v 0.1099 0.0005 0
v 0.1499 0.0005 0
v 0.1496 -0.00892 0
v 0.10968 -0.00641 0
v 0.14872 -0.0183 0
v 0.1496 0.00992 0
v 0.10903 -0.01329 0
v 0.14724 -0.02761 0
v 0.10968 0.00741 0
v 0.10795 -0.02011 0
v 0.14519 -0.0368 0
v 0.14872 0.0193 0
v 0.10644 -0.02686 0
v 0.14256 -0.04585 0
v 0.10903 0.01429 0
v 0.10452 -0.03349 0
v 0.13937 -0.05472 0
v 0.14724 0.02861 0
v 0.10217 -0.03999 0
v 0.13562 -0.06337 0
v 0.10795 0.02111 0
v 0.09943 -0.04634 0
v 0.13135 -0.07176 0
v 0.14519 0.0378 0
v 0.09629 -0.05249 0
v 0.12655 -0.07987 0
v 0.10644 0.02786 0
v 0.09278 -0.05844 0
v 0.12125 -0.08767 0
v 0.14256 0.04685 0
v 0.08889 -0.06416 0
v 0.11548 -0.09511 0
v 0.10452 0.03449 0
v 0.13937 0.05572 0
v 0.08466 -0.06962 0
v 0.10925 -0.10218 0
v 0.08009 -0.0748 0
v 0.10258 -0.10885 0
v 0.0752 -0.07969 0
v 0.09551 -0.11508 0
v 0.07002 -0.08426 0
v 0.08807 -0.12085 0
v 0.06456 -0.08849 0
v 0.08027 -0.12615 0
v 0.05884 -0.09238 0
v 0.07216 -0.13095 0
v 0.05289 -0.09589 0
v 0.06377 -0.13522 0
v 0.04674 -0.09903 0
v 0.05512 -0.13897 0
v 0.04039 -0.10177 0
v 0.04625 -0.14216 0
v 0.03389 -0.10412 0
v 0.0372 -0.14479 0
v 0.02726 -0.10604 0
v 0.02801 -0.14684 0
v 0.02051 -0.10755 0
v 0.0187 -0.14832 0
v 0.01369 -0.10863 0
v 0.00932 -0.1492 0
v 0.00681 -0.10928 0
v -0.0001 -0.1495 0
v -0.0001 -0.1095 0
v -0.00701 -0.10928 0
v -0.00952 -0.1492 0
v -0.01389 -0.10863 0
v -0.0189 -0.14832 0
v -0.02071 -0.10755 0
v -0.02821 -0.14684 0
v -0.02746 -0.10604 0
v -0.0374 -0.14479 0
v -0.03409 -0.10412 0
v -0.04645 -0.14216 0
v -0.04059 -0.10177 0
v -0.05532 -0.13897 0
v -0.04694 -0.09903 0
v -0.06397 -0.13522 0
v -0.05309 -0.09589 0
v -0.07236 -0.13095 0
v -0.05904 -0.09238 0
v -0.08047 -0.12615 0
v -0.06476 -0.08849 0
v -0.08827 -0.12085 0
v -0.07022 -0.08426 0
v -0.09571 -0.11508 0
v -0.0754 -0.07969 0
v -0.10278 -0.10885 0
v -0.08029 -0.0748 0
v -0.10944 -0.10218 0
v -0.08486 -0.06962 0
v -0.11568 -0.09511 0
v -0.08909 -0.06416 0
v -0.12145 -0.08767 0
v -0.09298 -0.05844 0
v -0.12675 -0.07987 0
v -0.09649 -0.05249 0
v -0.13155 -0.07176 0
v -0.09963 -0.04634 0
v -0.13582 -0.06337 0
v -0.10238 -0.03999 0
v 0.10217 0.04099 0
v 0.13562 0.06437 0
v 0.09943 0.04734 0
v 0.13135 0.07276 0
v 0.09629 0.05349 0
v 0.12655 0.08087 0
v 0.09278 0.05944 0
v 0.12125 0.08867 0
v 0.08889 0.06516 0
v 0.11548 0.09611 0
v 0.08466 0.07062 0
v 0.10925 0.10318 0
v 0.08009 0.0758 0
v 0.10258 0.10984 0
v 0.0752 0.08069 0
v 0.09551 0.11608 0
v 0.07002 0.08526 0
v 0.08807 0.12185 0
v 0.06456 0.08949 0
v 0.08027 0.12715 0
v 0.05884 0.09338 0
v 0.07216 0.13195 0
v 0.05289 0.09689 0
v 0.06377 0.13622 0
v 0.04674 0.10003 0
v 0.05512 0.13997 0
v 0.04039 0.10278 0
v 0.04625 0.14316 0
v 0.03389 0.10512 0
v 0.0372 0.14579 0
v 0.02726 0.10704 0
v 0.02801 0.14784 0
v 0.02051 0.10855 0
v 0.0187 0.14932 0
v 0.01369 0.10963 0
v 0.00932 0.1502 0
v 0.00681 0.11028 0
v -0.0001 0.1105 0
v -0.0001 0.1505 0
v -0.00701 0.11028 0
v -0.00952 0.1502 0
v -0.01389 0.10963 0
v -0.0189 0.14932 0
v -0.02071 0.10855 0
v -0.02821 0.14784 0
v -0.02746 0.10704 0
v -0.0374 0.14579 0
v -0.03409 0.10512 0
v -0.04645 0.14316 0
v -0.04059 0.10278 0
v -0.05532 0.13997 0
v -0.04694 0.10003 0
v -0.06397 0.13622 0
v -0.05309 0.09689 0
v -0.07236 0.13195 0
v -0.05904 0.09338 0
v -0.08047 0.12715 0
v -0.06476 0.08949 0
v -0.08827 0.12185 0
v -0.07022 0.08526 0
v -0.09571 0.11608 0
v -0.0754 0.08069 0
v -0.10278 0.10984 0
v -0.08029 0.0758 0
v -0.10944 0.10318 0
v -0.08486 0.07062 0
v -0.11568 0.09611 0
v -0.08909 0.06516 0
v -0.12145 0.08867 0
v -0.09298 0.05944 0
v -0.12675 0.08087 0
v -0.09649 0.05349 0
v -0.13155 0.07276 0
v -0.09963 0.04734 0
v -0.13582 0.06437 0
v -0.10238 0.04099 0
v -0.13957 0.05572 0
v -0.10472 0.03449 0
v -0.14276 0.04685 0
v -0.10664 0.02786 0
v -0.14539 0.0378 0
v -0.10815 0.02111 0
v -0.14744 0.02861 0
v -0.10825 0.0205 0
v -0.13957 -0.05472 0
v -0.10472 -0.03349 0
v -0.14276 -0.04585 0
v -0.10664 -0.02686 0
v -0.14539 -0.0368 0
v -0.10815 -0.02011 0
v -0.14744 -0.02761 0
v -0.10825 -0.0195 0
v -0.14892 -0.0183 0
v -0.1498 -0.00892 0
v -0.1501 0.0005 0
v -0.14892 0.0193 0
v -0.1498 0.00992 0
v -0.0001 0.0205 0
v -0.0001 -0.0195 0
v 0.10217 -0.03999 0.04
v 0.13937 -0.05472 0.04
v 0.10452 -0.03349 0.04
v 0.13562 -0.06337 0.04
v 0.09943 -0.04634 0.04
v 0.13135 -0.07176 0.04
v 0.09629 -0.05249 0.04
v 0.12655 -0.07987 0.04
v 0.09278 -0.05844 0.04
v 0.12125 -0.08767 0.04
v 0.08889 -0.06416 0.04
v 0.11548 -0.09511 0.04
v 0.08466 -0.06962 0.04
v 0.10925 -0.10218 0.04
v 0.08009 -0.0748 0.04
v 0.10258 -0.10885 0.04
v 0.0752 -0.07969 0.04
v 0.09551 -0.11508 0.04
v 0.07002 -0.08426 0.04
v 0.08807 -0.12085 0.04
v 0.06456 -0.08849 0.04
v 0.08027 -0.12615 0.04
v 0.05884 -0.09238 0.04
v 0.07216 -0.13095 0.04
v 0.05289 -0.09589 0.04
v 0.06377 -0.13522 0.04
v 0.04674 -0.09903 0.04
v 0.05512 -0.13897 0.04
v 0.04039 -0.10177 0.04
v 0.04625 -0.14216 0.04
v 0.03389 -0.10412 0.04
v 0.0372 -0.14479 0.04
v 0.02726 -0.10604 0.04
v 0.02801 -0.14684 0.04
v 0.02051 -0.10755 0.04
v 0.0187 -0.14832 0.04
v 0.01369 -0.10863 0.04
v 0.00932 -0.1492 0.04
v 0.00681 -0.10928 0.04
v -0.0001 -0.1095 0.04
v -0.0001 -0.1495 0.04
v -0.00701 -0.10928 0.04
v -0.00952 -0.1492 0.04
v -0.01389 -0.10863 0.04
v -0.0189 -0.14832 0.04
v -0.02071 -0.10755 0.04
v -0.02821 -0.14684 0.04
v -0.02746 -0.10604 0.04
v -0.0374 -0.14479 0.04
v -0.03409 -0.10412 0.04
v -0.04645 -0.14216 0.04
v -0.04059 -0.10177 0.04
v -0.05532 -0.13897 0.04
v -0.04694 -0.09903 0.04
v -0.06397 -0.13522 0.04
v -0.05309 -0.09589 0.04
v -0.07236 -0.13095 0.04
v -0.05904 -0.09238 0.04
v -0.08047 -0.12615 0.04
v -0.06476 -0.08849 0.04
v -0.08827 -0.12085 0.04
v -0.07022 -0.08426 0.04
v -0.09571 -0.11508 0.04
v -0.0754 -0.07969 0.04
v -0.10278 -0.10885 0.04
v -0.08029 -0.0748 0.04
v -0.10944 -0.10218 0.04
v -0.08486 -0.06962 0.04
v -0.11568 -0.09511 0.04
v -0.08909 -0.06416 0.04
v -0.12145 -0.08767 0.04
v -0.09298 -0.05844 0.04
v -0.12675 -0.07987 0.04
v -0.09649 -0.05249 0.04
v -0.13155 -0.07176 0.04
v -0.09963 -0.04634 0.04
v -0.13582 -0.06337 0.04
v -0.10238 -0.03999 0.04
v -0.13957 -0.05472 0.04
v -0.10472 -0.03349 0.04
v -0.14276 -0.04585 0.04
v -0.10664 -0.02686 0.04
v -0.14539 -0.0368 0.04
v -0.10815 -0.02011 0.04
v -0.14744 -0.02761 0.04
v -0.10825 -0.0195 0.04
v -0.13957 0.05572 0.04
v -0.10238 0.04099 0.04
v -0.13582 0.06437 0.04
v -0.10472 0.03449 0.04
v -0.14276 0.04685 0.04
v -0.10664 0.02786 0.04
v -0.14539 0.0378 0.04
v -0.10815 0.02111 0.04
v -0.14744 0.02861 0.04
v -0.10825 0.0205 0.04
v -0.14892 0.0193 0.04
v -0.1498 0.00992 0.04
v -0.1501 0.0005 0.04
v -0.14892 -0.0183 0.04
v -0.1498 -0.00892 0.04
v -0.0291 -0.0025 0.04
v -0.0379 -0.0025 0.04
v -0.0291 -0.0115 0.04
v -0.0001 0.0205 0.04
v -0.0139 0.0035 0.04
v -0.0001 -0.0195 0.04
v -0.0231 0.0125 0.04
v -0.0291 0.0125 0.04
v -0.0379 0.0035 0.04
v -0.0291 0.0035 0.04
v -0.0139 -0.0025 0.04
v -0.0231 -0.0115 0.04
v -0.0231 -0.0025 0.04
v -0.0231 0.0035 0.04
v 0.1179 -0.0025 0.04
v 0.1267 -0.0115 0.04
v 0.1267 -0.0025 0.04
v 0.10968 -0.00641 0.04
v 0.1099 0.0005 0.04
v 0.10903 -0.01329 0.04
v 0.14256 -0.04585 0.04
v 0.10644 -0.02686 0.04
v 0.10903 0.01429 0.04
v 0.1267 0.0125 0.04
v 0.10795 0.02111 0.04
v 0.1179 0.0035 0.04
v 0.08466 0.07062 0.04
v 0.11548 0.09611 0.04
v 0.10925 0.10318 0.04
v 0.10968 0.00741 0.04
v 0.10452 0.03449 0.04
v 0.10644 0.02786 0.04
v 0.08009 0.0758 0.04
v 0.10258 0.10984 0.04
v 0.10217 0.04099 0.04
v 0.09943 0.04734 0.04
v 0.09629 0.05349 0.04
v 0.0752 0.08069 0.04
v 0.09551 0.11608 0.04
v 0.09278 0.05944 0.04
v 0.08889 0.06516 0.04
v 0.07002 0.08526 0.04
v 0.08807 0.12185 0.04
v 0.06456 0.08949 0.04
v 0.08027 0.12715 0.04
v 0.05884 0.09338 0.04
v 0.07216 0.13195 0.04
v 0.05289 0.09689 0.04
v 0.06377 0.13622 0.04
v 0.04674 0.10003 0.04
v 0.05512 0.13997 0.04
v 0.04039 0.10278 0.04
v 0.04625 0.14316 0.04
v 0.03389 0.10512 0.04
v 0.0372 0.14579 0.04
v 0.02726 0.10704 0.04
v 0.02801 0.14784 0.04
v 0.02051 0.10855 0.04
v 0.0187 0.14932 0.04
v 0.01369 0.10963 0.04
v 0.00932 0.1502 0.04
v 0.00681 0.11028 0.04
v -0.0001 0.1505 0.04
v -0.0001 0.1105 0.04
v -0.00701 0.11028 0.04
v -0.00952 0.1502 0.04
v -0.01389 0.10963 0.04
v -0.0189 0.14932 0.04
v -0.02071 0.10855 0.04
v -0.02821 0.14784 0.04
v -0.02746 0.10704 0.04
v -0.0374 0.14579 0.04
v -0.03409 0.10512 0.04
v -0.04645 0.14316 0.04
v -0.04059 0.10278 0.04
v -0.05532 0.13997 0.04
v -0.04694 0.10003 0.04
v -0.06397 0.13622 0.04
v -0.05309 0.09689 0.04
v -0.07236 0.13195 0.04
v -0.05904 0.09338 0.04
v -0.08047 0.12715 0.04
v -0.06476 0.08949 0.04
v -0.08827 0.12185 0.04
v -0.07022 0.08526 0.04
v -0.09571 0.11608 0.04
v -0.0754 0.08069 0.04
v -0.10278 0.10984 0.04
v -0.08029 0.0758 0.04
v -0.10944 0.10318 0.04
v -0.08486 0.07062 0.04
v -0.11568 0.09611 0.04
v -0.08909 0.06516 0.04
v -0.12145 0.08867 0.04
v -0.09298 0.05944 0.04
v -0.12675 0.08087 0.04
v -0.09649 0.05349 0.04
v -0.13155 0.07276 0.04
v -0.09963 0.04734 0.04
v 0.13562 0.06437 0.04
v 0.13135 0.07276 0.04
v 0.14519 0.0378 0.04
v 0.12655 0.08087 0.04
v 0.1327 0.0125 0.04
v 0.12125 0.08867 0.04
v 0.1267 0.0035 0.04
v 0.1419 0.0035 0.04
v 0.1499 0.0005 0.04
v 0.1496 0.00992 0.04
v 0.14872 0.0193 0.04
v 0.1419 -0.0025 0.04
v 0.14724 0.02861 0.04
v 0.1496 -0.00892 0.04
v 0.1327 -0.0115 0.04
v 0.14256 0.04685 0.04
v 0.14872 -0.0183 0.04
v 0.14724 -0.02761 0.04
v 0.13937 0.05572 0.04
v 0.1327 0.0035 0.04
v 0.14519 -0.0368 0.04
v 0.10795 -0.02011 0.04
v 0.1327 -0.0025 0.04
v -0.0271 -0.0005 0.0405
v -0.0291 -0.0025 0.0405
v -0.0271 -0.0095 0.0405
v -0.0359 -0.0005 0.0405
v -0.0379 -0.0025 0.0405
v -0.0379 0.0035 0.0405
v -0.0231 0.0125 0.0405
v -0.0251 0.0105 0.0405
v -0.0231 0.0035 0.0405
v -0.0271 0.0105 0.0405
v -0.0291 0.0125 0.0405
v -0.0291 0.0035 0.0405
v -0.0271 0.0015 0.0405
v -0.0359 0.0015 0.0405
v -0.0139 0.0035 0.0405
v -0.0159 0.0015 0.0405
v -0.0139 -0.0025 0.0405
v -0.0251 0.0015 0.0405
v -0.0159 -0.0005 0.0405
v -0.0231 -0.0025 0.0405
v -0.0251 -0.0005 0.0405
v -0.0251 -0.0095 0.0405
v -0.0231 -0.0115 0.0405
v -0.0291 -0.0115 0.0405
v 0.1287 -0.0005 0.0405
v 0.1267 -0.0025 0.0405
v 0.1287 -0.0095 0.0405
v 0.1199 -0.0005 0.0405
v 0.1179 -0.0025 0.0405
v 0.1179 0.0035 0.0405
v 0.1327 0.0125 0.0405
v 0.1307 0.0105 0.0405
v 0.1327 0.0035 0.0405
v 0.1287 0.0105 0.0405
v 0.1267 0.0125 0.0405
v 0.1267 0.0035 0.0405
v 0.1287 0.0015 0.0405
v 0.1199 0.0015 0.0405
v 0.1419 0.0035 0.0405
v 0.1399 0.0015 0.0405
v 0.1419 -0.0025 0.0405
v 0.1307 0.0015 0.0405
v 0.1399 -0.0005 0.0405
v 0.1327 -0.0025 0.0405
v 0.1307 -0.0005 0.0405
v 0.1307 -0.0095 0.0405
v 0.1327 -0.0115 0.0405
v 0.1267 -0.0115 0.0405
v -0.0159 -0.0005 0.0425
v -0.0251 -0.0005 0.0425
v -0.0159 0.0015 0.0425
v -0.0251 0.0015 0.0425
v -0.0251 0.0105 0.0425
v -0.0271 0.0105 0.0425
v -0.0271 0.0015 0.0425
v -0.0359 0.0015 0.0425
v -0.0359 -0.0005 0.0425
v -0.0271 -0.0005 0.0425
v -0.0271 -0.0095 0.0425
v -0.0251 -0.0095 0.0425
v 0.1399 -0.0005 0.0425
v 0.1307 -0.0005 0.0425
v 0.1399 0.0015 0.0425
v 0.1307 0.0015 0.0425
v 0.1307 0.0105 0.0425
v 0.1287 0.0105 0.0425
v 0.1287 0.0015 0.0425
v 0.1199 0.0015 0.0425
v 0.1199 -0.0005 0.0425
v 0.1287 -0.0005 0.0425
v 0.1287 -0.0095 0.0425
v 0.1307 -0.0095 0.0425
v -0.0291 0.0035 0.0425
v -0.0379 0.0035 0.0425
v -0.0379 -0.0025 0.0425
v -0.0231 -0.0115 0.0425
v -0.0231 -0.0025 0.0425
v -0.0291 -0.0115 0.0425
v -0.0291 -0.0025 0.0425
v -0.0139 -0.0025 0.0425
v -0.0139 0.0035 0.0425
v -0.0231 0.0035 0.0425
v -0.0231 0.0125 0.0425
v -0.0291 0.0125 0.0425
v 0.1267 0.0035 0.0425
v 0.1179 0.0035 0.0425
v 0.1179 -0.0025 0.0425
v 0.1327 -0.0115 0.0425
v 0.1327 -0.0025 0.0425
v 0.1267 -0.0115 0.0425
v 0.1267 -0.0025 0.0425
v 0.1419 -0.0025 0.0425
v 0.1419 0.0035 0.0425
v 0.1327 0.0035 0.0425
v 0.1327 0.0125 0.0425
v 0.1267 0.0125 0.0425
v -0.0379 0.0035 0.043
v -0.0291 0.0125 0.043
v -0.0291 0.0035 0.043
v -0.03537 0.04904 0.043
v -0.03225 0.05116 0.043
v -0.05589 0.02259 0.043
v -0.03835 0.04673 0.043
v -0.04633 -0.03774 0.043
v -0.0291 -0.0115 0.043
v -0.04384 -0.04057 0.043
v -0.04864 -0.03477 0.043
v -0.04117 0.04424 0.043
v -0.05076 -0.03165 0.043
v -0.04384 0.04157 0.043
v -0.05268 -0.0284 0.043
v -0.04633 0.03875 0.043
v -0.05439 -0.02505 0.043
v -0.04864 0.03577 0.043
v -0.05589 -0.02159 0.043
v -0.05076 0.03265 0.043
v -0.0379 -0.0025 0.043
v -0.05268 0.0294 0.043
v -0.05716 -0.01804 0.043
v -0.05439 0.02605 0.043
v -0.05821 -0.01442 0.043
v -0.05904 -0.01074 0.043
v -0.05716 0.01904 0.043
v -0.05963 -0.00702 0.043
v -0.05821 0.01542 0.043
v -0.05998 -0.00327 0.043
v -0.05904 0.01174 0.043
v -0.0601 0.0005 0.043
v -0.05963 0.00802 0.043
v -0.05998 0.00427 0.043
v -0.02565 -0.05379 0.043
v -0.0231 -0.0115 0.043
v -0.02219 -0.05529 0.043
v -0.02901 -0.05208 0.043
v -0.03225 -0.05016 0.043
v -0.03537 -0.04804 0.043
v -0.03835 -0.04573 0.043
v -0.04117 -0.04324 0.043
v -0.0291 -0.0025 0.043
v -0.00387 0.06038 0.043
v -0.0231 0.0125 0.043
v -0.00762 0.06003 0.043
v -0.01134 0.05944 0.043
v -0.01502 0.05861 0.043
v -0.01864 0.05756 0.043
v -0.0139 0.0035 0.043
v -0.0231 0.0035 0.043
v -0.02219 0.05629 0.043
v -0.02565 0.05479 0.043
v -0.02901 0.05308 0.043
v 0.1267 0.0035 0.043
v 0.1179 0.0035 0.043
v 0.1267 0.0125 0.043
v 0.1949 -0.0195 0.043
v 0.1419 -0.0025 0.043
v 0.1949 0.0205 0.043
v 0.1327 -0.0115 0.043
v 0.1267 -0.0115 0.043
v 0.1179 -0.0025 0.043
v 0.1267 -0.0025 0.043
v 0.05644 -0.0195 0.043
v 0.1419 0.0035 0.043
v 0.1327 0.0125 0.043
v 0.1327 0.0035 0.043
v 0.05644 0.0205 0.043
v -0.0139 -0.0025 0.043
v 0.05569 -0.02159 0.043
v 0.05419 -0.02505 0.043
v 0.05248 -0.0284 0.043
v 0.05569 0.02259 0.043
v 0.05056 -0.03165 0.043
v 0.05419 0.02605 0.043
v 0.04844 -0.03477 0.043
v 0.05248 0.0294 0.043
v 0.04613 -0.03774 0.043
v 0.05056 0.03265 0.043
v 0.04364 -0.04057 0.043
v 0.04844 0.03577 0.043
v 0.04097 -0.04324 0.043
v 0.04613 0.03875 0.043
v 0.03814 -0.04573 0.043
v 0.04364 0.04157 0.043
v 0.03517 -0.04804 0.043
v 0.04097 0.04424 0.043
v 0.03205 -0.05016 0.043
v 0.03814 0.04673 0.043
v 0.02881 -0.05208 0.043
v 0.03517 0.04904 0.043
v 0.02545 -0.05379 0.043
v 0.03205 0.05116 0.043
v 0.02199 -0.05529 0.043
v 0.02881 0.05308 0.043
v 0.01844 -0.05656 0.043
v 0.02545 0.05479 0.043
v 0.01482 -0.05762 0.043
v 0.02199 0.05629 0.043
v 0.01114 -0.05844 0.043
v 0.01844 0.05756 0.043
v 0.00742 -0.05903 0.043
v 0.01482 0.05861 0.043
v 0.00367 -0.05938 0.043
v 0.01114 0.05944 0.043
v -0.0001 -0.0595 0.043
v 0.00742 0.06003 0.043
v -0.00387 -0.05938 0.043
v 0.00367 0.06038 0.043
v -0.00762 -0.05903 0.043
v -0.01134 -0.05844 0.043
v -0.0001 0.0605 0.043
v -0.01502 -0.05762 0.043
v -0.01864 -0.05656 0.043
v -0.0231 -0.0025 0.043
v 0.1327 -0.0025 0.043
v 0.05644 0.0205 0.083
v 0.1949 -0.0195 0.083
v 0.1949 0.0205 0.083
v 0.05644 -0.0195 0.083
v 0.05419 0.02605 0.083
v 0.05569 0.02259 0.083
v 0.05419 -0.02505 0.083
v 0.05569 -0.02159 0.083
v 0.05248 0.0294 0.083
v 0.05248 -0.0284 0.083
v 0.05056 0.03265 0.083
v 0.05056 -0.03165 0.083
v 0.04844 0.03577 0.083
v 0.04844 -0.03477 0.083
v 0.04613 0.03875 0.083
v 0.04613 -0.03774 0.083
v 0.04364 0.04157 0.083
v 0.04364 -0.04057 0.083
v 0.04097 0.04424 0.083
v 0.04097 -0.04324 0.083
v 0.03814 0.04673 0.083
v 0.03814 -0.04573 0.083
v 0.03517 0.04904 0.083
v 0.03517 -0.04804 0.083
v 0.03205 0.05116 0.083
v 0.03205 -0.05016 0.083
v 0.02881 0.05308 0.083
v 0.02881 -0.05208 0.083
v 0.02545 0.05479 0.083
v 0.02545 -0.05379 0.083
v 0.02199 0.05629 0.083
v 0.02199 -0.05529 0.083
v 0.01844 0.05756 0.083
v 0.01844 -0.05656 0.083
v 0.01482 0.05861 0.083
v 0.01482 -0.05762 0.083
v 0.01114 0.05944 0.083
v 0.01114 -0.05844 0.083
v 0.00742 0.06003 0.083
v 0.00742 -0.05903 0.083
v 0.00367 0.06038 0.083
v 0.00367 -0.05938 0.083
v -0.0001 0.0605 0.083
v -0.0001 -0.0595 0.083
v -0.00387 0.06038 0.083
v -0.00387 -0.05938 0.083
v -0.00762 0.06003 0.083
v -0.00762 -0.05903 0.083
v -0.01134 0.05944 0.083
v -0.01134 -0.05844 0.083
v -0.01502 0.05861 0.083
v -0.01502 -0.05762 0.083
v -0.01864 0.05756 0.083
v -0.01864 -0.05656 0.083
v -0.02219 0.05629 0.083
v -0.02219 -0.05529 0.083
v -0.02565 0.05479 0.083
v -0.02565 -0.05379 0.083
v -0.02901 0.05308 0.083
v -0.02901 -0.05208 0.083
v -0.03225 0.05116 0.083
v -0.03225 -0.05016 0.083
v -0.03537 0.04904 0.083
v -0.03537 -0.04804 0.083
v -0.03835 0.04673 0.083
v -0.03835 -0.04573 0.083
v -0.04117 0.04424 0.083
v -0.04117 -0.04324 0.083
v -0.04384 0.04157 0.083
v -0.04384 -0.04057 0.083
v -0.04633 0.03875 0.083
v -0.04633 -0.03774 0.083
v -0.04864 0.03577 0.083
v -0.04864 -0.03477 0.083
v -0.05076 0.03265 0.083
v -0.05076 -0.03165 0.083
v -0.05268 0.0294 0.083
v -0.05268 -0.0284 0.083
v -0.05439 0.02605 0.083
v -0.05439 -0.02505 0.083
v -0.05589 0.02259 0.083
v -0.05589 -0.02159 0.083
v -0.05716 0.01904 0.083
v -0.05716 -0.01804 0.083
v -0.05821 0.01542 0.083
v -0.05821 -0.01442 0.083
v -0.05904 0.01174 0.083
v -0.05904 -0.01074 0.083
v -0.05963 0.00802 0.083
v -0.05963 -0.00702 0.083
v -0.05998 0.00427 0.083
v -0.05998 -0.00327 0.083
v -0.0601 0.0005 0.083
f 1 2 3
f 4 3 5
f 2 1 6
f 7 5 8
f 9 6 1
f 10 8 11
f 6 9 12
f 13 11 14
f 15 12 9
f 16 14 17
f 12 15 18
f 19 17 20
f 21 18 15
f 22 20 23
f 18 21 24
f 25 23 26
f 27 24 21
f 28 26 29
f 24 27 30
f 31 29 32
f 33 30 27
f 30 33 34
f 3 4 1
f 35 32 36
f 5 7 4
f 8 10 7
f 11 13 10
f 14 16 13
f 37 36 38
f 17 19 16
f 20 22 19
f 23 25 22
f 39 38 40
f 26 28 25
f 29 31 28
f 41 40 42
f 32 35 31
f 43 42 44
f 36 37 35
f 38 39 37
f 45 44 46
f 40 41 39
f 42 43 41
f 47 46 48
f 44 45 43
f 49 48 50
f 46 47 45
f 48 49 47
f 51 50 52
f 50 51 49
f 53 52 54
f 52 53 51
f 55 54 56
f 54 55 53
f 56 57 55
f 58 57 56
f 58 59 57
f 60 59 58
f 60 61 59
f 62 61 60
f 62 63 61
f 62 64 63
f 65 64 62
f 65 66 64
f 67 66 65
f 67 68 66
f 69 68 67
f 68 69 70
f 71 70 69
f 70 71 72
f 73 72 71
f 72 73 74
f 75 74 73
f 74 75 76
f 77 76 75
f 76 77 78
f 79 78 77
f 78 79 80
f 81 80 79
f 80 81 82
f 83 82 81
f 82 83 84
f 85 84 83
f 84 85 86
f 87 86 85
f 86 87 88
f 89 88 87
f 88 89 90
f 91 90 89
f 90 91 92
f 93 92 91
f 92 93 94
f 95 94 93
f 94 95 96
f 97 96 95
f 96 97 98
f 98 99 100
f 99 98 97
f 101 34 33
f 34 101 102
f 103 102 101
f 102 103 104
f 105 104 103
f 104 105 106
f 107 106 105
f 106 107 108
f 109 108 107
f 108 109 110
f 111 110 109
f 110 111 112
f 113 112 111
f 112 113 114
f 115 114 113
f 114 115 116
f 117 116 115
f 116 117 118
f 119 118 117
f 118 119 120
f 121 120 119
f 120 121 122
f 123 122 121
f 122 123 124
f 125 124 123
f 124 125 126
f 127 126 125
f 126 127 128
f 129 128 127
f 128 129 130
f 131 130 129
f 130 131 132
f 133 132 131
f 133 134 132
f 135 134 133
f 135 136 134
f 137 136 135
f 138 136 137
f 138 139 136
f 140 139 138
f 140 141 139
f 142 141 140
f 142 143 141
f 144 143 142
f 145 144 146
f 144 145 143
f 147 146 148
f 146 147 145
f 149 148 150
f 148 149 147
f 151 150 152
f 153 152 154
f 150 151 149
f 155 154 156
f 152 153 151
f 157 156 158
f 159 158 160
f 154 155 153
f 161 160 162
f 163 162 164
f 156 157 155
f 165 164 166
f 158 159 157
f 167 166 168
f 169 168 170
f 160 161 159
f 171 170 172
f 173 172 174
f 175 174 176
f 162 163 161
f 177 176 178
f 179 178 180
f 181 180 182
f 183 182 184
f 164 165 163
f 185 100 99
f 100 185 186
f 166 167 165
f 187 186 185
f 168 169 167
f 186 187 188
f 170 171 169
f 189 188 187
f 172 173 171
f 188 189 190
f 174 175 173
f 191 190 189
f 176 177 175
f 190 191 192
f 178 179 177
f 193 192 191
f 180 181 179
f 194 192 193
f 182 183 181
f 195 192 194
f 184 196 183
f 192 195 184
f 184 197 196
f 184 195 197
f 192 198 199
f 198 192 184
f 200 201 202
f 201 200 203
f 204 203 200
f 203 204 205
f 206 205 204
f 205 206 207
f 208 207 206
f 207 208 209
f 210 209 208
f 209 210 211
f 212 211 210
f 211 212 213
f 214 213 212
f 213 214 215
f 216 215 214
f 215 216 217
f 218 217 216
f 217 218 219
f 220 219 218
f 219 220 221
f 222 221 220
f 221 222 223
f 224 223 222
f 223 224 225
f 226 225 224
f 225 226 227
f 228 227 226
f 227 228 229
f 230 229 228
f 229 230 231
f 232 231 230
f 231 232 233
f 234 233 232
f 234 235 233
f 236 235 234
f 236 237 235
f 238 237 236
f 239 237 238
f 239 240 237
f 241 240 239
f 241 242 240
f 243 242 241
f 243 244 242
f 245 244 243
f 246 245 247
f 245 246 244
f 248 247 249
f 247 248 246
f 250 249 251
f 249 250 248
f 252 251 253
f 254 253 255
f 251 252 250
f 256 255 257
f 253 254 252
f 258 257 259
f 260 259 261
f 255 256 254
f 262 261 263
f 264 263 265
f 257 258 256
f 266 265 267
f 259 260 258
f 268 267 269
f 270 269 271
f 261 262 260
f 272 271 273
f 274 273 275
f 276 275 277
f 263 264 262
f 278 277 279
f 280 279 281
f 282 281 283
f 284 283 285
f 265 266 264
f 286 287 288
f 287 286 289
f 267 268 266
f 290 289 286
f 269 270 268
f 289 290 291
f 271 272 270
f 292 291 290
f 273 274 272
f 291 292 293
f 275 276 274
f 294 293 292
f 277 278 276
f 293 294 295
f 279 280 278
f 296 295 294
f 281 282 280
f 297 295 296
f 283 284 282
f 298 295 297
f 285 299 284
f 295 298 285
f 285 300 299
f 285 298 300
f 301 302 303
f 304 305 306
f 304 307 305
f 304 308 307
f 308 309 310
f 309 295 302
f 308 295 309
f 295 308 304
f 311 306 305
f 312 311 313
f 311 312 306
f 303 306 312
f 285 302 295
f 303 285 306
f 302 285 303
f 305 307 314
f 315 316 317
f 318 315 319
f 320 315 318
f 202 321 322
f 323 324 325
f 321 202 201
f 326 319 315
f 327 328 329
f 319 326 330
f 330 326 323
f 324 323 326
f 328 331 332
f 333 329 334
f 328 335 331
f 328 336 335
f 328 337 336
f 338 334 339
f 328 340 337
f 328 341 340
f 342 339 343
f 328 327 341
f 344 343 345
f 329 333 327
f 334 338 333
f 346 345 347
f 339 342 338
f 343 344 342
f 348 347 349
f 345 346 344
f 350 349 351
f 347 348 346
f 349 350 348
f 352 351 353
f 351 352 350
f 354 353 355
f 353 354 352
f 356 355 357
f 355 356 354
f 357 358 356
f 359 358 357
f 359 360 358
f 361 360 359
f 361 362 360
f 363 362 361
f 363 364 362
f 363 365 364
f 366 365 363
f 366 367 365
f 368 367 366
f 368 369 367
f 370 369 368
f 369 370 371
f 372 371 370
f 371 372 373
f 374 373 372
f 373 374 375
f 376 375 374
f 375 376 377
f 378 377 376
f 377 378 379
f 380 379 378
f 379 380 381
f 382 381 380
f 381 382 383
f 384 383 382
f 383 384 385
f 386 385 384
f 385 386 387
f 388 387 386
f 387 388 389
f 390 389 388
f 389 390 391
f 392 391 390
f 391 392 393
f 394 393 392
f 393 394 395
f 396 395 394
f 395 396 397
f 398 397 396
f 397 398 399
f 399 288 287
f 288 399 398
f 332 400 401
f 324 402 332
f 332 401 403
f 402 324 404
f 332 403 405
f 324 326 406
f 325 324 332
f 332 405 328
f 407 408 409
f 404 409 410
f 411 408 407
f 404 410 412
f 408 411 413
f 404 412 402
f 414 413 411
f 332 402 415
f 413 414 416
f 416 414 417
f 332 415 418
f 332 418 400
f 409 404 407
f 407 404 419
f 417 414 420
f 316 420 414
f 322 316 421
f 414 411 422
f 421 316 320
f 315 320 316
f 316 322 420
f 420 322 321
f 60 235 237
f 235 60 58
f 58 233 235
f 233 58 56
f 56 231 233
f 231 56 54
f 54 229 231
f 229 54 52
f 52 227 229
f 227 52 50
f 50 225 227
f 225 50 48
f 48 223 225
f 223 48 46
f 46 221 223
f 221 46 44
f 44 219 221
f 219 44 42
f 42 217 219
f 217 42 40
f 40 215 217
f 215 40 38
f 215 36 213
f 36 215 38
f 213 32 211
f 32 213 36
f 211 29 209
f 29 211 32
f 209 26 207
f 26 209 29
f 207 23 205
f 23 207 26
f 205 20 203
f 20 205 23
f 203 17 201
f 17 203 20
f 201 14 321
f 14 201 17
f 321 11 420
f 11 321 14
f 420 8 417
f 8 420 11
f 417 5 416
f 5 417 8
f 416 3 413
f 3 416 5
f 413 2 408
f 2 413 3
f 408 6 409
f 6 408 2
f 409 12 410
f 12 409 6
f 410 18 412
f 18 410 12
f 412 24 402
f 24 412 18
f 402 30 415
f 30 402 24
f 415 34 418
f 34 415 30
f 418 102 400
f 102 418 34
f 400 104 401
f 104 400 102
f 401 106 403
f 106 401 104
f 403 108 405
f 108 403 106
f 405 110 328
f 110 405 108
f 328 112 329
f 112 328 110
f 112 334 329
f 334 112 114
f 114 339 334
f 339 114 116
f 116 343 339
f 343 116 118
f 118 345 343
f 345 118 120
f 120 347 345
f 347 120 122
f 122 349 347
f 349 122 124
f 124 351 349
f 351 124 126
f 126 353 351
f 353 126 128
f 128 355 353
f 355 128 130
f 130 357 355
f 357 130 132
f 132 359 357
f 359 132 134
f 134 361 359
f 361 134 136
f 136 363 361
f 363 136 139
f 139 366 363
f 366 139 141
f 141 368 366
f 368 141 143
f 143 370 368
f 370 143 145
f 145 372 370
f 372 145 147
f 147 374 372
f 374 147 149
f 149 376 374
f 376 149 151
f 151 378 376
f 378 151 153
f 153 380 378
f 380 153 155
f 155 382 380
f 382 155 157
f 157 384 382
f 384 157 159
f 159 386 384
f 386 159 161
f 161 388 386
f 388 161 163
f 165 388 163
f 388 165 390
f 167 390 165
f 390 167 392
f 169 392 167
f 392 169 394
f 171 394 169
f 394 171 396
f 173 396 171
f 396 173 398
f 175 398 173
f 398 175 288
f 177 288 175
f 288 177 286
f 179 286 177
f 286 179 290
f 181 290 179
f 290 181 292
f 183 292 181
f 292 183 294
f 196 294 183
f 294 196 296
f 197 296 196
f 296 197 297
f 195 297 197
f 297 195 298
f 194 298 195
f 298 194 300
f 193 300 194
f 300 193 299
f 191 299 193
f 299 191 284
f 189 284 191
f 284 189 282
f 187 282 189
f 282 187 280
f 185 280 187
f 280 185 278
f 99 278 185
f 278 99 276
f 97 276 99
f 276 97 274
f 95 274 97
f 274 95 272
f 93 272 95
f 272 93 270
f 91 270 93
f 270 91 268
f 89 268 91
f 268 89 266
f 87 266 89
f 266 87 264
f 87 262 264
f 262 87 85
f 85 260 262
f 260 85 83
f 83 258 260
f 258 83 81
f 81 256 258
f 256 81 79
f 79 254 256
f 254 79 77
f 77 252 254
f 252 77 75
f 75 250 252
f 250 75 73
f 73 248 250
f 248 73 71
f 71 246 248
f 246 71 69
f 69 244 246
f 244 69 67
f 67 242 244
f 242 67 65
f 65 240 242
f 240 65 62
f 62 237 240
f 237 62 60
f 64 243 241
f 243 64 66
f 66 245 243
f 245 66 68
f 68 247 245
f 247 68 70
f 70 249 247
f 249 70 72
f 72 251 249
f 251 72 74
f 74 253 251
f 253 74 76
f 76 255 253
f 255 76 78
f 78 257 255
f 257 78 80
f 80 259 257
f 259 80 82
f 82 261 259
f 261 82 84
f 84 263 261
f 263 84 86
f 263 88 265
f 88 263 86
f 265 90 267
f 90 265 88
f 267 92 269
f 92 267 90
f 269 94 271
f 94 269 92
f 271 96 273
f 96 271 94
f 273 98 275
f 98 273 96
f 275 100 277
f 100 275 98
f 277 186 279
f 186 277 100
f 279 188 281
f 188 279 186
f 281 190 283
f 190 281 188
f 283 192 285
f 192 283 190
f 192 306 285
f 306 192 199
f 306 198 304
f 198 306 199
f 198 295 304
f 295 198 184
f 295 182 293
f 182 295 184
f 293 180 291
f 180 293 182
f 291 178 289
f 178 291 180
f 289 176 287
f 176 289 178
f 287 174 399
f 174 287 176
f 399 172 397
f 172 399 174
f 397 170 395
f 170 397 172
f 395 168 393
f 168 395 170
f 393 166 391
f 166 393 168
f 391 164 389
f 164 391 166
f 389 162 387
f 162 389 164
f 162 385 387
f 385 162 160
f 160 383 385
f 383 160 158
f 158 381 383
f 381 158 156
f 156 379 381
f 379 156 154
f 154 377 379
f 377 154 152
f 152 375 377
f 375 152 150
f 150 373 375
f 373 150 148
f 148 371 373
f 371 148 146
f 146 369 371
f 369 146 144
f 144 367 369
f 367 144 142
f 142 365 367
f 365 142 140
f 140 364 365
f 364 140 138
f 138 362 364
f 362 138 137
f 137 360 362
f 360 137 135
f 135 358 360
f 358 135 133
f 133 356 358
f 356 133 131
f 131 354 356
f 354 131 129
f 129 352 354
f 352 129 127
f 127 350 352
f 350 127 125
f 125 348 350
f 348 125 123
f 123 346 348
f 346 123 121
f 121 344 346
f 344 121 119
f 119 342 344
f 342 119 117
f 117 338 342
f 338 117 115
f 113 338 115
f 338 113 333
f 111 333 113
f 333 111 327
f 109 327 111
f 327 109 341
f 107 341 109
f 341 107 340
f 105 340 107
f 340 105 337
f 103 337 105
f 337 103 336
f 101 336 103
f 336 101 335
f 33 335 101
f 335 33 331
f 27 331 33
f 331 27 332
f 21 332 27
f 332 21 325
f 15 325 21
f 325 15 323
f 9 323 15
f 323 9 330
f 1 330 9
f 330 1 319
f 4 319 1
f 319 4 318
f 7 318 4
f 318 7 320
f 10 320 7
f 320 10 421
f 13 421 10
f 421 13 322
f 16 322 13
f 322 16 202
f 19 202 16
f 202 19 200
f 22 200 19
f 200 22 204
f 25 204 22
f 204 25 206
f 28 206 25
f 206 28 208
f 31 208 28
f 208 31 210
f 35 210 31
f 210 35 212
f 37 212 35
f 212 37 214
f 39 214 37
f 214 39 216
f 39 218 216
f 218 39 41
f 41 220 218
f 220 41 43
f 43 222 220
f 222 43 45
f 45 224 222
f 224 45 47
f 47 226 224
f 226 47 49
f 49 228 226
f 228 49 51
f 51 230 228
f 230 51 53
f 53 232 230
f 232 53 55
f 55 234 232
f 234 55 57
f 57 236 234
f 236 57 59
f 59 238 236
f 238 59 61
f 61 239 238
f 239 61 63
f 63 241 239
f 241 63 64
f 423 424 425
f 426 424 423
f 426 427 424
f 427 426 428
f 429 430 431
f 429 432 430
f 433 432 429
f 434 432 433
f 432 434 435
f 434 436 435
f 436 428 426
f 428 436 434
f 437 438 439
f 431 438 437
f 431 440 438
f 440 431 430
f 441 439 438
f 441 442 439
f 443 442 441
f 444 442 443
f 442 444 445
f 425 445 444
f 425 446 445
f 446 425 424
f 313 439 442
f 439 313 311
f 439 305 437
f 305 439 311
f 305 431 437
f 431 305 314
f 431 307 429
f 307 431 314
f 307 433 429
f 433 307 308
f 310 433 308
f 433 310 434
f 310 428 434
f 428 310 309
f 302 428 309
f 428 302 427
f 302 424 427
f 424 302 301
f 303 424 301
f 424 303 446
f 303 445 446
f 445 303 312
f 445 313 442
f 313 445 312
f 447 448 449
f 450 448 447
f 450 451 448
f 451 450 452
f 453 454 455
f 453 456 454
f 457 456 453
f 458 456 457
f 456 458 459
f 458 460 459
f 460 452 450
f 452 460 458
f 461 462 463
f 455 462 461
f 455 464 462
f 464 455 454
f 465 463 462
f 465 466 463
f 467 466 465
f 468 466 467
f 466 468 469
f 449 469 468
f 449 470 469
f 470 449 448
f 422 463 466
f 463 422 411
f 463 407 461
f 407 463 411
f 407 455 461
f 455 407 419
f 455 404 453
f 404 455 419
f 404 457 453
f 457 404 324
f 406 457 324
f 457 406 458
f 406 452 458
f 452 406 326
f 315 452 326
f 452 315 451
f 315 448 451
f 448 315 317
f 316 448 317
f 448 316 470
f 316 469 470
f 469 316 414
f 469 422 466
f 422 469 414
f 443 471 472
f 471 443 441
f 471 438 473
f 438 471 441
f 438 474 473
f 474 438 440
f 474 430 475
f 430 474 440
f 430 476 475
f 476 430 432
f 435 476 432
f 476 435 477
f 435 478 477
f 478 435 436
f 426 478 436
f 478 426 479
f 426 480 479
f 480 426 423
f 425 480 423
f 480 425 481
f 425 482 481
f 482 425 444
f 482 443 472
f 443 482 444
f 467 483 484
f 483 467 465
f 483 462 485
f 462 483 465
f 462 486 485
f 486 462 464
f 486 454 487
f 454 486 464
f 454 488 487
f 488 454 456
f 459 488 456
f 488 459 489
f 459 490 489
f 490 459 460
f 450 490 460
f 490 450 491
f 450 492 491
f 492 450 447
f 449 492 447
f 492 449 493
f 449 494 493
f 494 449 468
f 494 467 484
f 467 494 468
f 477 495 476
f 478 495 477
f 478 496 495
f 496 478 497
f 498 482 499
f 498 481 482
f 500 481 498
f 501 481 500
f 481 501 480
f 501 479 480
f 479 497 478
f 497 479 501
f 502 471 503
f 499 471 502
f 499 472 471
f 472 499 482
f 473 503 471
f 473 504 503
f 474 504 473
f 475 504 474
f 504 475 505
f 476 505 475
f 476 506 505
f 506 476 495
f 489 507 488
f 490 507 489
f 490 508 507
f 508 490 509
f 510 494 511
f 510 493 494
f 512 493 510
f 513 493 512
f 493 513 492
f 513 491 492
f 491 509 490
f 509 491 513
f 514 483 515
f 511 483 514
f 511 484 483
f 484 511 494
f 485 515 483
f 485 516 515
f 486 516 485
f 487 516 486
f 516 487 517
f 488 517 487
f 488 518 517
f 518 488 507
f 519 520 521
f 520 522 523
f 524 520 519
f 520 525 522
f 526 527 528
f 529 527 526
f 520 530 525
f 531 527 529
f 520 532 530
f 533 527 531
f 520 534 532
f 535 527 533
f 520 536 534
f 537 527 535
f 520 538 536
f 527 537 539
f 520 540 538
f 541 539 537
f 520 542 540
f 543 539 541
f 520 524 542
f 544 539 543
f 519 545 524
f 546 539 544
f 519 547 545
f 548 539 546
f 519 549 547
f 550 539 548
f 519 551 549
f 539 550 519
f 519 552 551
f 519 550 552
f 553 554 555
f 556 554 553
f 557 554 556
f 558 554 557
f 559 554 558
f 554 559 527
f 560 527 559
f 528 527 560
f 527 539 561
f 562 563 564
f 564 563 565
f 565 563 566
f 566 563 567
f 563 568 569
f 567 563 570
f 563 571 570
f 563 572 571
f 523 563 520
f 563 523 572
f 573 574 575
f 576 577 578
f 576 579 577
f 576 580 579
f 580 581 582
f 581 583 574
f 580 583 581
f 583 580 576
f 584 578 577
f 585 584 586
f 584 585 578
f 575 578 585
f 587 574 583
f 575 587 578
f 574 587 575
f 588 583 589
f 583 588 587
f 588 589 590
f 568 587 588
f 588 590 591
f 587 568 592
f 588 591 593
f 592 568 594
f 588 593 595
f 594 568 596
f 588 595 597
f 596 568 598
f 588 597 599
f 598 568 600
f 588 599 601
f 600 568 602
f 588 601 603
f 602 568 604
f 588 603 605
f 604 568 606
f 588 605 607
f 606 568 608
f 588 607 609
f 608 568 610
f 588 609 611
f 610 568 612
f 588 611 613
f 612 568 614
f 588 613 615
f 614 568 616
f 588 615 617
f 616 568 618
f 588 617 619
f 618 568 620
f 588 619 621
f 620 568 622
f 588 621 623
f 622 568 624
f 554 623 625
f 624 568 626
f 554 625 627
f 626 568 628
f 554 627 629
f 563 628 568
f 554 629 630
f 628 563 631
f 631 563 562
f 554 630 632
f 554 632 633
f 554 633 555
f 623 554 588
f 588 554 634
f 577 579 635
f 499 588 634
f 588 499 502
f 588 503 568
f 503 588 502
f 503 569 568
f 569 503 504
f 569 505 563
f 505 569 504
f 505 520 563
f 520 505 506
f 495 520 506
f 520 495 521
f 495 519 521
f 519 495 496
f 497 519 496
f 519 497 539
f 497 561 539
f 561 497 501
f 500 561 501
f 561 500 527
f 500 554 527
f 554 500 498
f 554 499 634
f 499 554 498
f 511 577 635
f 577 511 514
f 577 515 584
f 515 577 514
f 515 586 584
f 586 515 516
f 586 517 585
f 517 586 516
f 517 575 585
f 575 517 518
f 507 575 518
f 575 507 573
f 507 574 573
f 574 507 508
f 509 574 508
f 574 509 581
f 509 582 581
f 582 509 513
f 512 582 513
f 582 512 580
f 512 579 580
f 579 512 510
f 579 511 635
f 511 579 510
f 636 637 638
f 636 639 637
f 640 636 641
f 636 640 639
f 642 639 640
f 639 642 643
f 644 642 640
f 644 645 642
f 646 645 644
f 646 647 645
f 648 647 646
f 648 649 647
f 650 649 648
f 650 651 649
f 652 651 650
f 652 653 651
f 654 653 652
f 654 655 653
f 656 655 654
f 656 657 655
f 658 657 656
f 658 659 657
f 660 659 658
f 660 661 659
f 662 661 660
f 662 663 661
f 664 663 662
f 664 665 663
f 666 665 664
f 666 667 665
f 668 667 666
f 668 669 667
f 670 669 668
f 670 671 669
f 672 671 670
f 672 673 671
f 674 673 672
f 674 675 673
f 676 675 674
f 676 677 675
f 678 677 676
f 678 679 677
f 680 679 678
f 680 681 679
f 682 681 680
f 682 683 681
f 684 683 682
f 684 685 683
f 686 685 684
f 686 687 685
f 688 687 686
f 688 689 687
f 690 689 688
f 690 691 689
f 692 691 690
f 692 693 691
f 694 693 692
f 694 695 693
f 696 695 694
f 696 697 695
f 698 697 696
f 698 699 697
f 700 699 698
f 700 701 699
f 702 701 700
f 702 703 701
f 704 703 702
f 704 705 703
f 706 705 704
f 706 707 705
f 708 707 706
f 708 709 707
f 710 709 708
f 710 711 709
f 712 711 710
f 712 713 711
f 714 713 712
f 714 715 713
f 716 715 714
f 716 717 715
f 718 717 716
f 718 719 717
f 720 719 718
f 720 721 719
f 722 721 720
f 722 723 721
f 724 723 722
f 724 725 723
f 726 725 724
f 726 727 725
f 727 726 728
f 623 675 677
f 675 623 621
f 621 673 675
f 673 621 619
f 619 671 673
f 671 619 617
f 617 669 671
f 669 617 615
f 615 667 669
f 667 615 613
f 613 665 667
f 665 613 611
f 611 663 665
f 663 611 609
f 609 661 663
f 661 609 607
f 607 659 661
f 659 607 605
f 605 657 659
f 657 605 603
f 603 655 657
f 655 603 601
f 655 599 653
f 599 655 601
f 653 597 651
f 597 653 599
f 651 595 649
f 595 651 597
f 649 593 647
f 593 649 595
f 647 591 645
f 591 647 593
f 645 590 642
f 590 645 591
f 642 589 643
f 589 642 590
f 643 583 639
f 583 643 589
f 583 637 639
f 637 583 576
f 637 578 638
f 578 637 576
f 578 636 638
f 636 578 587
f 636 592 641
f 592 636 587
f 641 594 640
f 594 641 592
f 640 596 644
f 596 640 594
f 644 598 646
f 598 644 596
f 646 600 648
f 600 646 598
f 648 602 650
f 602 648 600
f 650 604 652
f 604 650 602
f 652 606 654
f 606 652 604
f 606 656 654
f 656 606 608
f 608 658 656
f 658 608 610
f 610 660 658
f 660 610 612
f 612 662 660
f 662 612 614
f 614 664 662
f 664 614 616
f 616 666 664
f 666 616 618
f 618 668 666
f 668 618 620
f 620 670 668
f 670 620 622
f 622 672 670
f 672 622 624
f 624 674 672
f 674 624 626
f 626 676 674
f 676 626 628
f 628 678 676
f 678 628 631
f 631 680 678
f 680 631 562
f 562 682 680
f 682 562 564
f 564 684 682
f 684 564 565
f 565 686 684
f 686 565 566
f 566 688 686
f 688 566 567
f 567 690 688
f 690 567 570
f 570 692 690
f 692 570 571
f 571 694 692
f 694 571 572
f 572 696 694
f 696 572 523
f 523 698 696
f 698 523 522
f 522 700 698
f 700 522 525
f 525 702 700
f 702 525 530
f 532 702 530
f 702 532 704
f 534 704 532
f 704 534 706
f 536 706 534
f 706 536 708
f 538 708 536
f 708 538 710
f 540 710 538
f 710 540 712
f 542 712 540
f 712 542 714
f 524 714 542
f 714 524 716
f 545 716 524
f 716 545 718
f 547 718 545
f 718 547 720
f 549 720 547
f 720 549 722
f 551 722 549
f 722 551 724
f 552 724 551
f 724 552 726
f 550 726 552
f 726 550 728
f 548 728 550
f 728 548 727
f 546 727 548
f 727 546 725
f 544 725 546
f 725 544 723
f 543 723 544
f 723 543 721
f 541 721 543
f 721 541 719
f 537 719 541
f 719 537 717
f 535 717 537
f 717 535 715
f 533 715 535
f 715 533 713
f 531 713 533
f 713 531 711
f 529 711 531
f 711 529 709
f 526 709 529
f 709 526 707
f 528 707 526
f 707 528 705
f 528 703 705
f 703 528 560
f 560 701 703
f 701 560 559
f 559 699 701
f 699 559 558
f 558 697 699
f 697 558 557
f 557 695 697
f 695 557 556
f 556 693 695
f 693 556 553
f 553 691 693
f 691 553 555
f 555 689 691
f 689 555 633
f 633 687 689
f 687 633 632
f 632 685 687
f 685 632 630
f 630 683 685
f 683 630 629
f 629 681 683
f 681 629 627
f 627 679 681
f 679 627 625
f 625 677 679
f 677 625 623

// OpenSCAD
scale(v = 0.0000010000) {
	translate(v = [0, 0, 0]) {
		union() {
			color(alpha = 1.0000000000, c = [1, 1, 1]) {
				translate(v = [0, 0, 0]) {
					linear_extrude(height = 40000) {
						difference() {
							polygon(points = [[-100, -149500], [-9519, -149204], [-18900, -148317], [-28207, -146843], [-37403, -144787], [-46453, -142158], [-55319, -138966], [-63967, -135224], [-72363, -130946], [-80474, -126149], [-88268, -120853], [-95714, -115077], [-102782, -108845], [-109445, -102182], [-115677, -95114], [-121453, -87668], [-126749, -79874], [-131546, -71763], [-135824, -63367], [-139566, -54719], [-142758, -45853], [-145387, -36803], [-147443, -27607], [-148917, -18300], [-149804, -8919], [-150100, 500], [-149804, 9919], [-148917, 19300], [-147443, 28607], [-145387, 37803], [-142758, 46853], [-139566, 55719], [-135824, 64367], [-131546, 72763], [-126749, 80874], [-121453, 88668], [-115677, 96114], [-109445, 103182], [-102782, 109845], [-95714, 116077], [-88268, 121853], [-80474, 127149], [-72363, 131946], [-63967, 136224], [-55319, 139966], [-46453, 143158], [-37403, 145787], [-28207, 147843], [-18900, 149317], [-9519, 150204], [-100, 150500], [9319, 150204], [18700, 149317], [28007, 147843], [37203, 145787], [46253, 143158], [55119, 139966], [63767, 136224], [72163, 131946], [80274, 127149], [88068, 121853], [95514, 116077], [102582, 109845], [109245, 103182], [115477, 96114], [121253, 88668], [126549, 80874], [131346, 72763], [135624, 64367], [139366, 55719], [142558, 46853], [145187, 37803], [147243, 28607], [148717, 19300], [149604, 9919], [149900, 500], [149604, -8919], [148717, -18300], [147243, -27607], [145187, -36803], [142558, -45853], [139366, -54719], [135624, -63367], [131346, -71763], [126549, -79874], [121253, -87668], [115477, -95114], [109245, -102182], [102582, -108845], [95514, -115077], [88068, -120853], [80274, -126149], [72163, -130946], [63767, -135224], [55119, -138966], [46253, -142158], [37203, -144787], [28007, -146843], [18700, -148317], [9319, -149204]]);
							polygon(points = [[-100, -109500], [6807, -109283], [13687, -108633], [20512, -107552], [27256, -106044], [33892, -104116], [40394, -101775], [46736, -99031], [52893, -95894], [58841, -92376], [64556, -88492], [70017, -84256], [75200, -79687], [80087, -74800], [84656, -69617], [88892, -64156], [92776, -58441], [96294, -52493], [99431, -46336], [102175, -39994], [104516, -33492], [106444, -26856], [107952, -20112], [109033, -13287], [109683, -6407], [109900, 500], [109683, 7407], [109033, 14287], [107952, 21112], [106444, 27856], [104516, 34492], [102175, 40994], [99431, 47336], [96294, 53493], [92776, 59441], [88892, 65156], [84656, 70617], [80087, 75800], [75200, 80687], [70017, 85256], [64556, 89492], [58841, 93376], [52893, 96894], [46736, 100031], [40394, 102775], [33892, 105116], [27256, 107044], [20512, 108552], [13687, 109633], [6807, 110283], [-100, 110500], [-7007, 110283], [-13887, 109633], [-20712, 108552], [-27456, 107044], [-34092, 105116], [-40594, 102775], [-46936, 100031], [-53093, 96894], [-59041, 93376], [-64756, 89492], [-70217, 85256], [-75400, 80687], [-80287, 75800], [-84856, 70617], [-89092, 65156], [-92976, 59441], [-96494, 53493], [-99631, 47336], [-102375, 40994], [-104716, 34492], [-106644, 27856], [-108152, 21112], [-108249, 20500], [-100, 20500], [-100, -19500], [-108249, -19500], [-108152, -20112], [-106644, -26856], [-104716, -33492], [-102375, -39994], [-99631, -46336], [-96494, -52493], [-92976, -58441], [-89092, -64156], [-84856, -69617], [-80287, -74800], [-75400, -79687], [-70217, -84256], [-64756, -88492], [-59041, -92376], [-53093, -95894], [-46936, -99031], [-40594, -101775], [-34092, -104116], [-27456, -106044], [-20712, -107552], [-13887, -108633], [-7007, -109283]]);
						}
					}
				}
			}
			color(alpha = 1.0000000000, c = [0.7000000000, 0, 0]) {
				translate(v = [0, 0, 40000]) {
					linear_extrude(height = 500) {
						polygon(points = [[-29100, -11500], [-29100, -2500], [-37900, -2500], [-37900, 3500], [-29100, 3500], [-29100, 12500], [-23100, 12500], [-23100, 3500], [-13900, 3500], [-13900, -2500], [-23100, -2500], [-23100, -11500]]);
					}
				}
			}
			color(alpha = 1.0000000000, c = [0.7000000000, 0, 0]) {
				translate(v = [0, 0, 40000]) {
					linear_extrude(height = 500) {
						polygon(points = [[126700, -11500], [126700, -2500], [117900, -2500], [117900, 3500], [126700, 3500], [126700, 12500], [132700, 12500], [132700, 3500], [141900, 3500], [141900, -2500], [132700, -2500], [132700, -11500]]);
					}
				}
			}
			color(alpha = 1.0000000000, c = [1, 1, 0]) {
				translate(v = [0, 0, 40500]) {
					linear_extrude(height = 500) {
						polygon(points = [[-27100, -9500], [-27100, -500], [-35900, -500], [-35900, 1500], [-27100, 1500], [-27100, 10500], [-25100, 10500], [-25100, 1500], [-15900, 1500], [-15900, -500], [-25100, -500], [-25100, -9500]]);
					}
				}
			}
			color(alpha = 1.0000000000, c = [1, 1, 0]) {
				translate(v = [0, 0, 40500]) {
					linear_extrude(height = 500) {
						polygon(points = [[128700, -9500], [128700, -500], [119900, -500], [119900, 1500], [128700, 1500], [128700, 10500], [130700, 10500], [130700, 1500], [139900, 1500], [139900, -500], [130700, -500], [130700, -9500]]);
					}
				}
			}
			color(alpha = 1.0000000000, c = [1, 1, 0]) {
				translate(v = [0, 0, 41000]) {
					linear_extrude(height = 500) {
						polygon(points = [[-27100, -9500], [-27100, -500], [-35900, -500], [-35900, 1500], [-27100, 1500], [-27100, 10500], [-25100, 10500], [-25100, 1500], [-15900, 1500], [-15900, -500], [-25100, -500], [-25100, -9500]]);
					}
				}
			}
			color(alpha = 1.0000000000, c = [1, 1, 0]) {
				translate(v = [0, 0, 41000]) {
					linear_extrude(height = 500) {
						polygon(points = [[128700, -9500], [128700, -500], [119900, -500], [119900, 1500], [128700, 1500], [128700, 10500], [130700, 10500], [130700, 1500], [139900, 1500], [139900, -500], [130700, -500], [130700, -9500]]);
					}
				}
			}
			color(alpha = 1.0000000000, c = [0, 1, 0]) {
				translate(v = [0, 0, 41500]) {
					linear_extrude(height = 500) {
						polygon(points = [[-27100, -9500], [-27100, -500], [-35900, -500], [-35900, 1500], [-27100, 1500], [-27100, 10500], [-25100, 10500], [-25100, 1500], [-15900, 1500], [-15900, -500], [-25100, -500], [-25100, -9500]]);
					}
				}
			}
			color(alpha = 1.0000000000, c = [0, 1, 0]) {
				translate(v = [0, 0, 41500]) {
					linear_extrude(height = 500) {
						polygon(points = [[128700, -9500], [128700, -500], [119900, -500], [119900, 1500], [128700, 1500], [128700, 10500], [130700, 10500], [130700, 1500], [139900, 1500], [139900, -500], [130700, -500], [130700, -9500]]);
					}
				}
			}
			color(alpha = 1.0000000000, c = [0, 1, 0]) {
				translate(v = [0, 0, 42000]) {
					linear_extrude(height = 500) {
						polygon(points = [[-27100, -9500], [-27100, -500], [-35900, -500], [-35900, 1500], [-27100, 1500], [-27100, 10500], [-25100, 10500], [-25100, 1500], [-15900, 1500], [-15900, -500], [-25100, -500], [-25100, -9500]]);
					}
				}
			}
			color(alpha = 1.0000000000, c = [0, 1, 0]) {
				translate(v = [0, 0, 42000]) {
					linear_extrude(height = 500) {
						polygon(points = [[128700, -9500], [128700, -500], [119900, -500], [119900, 1500], [128700, 1500], [128700, 10500], [130700, 10500], [130700, 1500], [139900, 1500], [139900, -500], [130700, -500], [130700, -9500]]);
					}
				}
			}
			color(alpha = 1.0000000000, c = [1, 0.7000000000, 0]) {
				translate(v = [0, 0, 42500]) {
					linear_extrude(height = 500) {
						polygon(points = [[-29100, -11500], [-29100, -2500], [-37900, -2500], [-37900, 3500], [-29100, 3500], [-29100, 12500], [-23100, 12500], [-23100, 3500], [-13900, 3500], [-13900, -2500], [-23100, -2500], [-23100, -11500]]);
					}
				}
			}
			color(alpha = 1.0000000000, c = [1, 0.7000000000, 0]) {
				translate(v = [0, 0, 42500]) {
					linear_extrude(height = 500) {
						polygon(points = [[126700, -11500], [126700, -2500], [117900, -2500], [117900, 3500], [126700, 3500], [126700, 12500], [132700, 12500], [132700, 3500], [141900, 3500], [141900, -2500], [132700, -2500], [132700, -11500]]);
					}
				}
			}
			color(alpha = 1.0000000000, c = [0.4000000000, 0.4000000000, 0.4000000000]) {
				translate(v = [0, 0, 43000]) {
					linear_extrude(height = 40000) {
						polygon(points = [[-100, -59500], [-3867, -59382], [-7620, -59027], [-11343, -58437], [-15021, -57615], [-18641, -56563], [-22187, -55287], [-25647, -53790], [-29005, -52078], [-32250, -50160], [-35367, -48041], [-38345, -45731], [-41173, -43238], [-43838, -40573], [-46331, -37745], [-48641, -34767], [-50760, -31650], [-52678, -28405], [-54390, -25047], [-55887, -21587], [-57163, -18041], [-58215, -14421], [-59037, -10743], [-59627, -7020], [-59982, -3267], [-60100, 500], [-59982, 4267], [-59627, 8020], [-59037, 11743], [-58215, 15421], [-57163, 19041], [-55887, 22587], [-54390, 26047], [-52678, 29405], [-50760, 32650], [-48641, 35767], [-46331, 38745], [-43838, 41573], [-41173, 44238], [-38345, 46731], [-35367, 49041], [-32250, 51160], [-29005, 53078], [-25647, 54790], [-22187, 56287], [-18641, 57563], [-15021, 58615], [-11343, 59437], [-7620, 60027], [-3867, 60382], [-100, 60500], [3667, 60382], [7420, 60027], [11143, 59437], [14821, 58615], [18441, 57563], [21987, 56287], [25447, 54790], [28805, 53078], [32050, 51160], [35167, 49041], [38145, 46731], [40973, 44238], [43638, 41573], [46131, 38745], [48441, 35767], [50560, 32650], [52478, 29405], [54190, 26047], [55687, 22587], [56438, 20500], [194900, 20500], [194900, -19500], [56438, -19500], [55687, -21587], [54190, -25047], [52478, -28405], [50560, -31650], [48441, -34767], [46131, -37745], [43638, -40573], [40973, -43238], [38145, -45731], [35167, -48041], [32050, -50160], [28805, -52078], [25447, -53790], [21987, -55287], [18441, -56563], [14821, -57615], [11143, -58437], [7420, -59027], [3667, -59382]]);
					}
				}
			}
		}
	}
}
